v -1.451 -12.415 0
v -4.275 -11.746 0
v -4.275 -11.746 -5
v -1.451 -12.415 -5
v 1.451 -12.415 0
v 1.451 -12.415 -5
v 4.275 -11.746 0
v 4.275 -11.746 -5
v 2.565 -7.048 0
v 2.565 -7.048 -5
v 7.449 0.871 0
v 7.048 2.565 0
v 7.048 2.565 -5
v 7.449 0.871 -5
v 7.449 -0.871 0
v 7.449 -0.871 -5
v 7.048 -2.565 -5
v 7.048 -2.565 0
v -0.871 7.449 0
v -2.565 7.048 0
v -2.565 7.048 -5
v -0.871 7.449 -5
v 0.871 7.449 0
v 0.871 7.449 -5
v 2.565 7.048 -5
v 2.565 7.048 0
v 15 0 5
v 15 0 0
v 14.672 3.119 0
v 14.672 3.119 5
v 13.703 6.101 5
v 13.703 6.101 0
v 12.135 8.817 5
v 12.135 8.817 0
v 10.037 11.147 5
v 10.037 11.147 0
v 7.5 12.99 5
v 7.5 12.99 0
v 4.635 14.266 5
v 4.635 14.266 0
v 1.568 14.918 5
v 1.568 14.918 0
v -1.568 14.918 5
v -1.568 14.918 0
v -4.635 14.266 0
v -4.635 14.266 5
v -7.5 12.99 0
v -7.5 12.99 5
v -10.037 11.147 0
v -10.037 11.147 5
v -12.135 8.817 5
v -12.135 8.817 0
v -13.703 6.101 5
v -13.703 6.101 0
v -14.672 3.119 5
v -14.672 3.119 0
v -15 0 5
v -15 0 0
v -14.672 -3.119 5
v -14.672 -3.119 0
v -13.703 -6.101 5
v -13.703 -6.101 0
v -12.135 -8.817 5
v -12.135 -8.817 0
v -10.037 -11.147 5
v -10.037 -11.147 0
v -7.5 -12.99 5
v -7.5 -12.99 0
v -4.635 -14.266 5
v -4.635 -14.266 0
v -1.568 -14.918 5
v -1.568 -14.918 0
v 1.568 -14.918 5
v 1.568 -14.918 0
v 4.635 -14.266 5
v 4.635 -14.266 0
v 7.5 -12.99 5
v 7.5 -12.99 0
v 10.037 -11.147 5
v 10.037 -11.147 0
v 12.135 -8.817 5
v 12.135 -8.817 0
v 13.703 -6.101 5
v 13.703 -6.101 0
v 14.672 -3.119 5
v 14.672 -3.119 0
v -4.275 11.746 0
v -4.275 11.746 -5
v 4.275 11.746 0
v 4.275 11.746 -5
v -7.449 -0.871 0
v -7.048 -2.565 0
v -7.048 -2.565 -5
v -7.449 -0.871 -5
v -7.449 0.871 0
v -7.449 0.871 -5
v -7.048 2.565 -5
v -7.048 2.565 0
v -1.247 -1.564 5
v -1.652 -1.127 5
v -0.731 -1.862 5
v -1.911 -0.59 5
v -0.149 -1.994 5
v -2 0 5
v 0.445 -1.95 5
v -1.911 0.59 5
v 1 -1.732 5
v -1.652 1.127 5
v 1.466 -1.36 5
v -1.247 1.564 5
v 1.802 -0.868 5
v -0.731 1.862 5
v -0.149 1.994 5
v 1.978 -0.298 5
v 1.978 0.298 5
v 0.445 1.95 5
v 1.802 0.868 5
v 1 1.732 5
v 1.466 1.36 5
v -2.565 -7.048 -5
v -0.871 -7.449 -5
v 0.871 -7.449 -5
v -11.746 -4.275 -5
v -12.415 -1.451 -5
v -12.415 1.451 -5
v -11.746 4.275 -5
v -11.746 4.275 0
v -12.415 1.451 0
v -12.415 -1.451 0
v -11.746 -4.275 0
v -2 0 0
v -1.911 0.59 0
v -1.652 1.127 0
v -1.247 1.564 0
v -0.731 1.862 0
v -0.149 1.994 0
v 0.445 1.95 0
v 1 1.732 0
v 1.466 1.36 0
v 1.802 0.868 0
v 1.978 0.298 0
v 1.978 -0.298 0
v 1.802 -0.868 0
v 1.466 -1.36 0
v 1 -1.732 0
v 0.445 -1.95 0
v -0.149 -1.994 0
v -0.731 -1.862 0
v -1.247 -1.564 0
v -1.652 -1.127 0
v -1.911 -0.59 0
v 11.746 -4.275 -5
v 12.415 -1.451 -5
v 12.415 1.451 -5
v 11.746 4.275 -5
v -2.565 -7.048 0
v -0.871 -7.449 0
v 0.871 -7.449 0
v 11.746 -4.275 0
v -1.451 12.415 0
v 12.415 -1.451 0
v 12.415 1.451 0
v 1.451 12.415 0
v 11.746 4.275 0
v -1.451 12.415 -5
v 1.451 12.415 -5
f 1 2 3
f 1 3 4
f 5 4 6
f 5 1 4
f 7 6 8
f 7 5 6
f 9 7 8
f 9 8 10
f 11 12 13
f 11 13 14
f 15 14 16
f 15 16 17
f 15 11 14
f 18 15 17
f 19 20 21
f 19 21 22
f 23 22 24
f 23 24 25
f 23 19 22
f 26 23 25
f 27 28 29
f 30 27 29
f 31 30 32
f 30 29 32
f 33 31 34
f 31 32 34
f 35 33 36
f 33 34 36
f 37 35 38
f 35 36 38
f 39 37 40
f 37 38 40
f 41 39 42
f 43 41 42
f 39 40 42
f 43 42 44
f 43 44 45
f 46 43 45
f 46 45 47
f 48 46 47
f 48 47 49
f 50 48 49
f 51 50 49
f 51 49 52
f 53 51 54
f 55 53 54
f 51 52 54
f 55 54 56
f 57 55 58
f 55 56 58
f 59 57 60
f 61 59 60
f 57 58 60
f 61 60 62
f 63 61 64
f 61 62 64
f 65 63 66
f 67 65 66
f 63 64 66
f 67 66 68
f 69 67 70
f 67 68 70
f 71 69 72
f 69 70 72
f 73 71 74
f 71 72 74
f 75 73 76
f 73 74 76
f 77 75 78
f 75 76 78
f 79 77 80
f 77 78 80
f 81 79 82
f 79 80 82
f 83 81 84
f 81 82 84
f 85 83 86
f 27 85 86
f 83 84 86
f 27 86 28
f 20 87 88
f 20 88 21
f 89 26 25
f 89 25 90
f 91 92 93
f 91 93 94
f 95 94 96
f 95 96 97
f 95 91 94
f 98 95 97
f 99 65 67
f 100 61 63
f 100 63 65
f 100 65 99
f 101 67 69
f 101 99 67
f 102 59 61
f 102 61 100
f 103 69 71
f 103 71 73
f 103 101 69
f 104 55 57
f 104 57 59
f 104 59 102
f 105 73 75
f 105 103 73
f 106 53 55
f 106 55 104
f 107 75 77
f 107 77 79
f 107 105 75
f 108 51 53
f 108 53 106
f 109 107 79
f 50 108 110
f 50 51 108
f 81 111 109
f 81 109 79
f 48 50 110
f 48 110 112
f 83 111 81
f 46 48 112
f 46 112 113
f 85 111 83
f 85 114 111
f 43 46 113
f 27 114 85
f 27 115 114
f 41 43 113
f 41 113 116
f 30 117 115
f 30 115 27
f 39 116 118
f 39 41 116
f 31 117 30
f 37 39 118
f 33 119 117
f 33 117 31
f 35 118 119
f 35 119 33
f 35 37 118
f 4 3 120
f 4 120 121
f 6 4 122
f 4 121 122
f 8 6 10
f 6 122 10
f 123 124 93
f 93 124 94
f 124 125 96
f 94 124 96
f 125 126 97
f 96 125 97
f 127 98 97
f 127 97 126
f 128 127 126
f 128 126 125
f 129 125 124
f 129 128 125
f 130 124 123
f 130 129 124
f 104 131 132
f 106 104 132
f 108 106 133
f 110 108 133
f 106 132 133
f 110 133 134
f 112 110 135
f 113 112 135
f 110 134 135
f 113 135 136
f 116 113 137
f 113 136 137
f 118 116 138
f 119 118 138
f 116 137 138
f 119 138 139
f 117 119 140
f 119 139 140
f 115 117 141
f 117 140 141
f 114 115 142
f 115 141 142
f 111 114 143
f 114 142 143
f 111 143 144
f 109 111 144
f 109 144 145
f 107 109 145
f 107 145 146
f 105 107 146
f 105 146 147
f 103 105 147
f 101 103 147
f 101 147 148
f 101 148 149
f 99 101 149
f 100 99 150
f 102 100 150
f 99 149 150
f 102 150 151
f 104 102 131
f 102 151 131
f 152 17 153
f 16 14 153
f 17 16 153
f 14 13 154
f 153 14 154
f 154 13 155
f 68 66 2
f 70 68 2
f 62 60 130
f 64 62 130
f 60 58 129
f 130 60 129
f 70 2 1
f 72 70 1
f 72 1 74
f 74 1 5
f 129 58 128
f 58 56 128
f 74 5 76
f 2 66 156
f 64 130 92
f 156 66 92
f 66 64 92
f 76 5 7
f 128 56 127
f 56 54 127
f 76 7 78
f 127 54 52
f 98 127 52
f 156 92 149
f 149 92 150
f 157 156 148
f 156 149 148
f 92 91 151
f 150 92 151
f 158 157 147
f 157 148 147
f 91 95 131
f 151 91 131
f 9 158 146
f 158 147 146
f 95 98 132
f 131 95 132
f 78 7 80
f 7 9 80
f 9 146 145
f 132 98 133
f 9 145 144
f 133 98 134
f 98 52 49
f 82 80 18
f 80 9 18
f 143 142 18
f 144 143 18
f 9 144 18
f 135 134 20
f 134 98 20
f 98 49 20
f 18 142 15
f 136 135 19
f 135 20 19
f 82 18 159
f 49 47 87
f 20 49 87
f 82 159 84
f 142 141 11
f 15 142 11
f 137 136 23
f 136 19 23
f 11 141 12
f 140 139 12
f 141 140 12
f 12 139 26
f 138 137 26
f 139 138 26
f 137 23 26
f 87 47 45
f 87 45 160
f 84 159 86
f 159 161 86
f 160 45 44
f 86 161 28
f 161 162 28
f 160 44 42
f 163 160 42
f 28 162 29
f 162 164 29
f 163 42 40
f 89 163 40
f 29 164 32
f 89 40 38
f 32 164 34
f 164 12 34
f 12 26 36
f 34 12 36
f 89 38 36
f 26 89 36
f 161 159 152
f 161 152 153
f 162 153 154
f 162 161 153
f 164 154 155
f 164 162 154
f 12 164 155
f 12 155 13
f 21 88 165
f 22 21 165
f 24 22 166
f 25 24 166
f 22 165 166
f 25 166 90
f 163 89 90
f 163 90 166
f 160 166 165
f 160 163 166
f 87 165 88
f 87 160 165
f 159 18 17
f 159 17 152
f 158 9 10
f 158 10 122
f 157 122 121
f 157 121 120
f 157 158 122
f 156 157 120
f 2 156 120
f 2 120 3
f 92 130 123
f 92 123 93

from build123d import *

# Parameters (mm, degrees)
SKETCH_1_R          = 15
EXTRUDE_1_DEPTH     = 5
EXTRUDE_2_DEPTH     = 5
SKETCH_3_R          = 2
CUT_EXTRUDE_1_DEPTH = 5


with BuildPart() as part:
    # 草图1 → 凸台-拉伸1 (new body)
    with BuildSketch(Plane.XY):
        Circle(SKETCH_1_R)
    extrude(amount=EXTRUDE_1_DEPTH)

    # 草图2 → 凸台-拉伸2 (add)
    with BuildSketch(Plane(origin=(0, 0, 0), x_dir=(-1, 0, 0), z_dir=(0, 0, -1))):
        with BuildLine():
            Line((-2.565151075, 7.047694656), (-4.275251792, 11.74615776))
            ThreePointArc((-4.275251792, 11.74615776), (0, 12.5), (4.275251792, 11.74615776))
            Line((4.275251792, 11.74615776), (2.565151075, 7.047694656))
            ThreePointArc((2.565151075, 7.047694656), (0, 7.5), (-2.565151075, 7.047694656))
        make_face()
        with BuildLine():
            Line((7.047694656, 2.565151075), (11.74615776, 4.275251792))
            ThreePointArc((11.74615776, 4.275251792), (12.5, 0), (11.74615776, -4.275251792))
            Line((11.74615776, -4.275251792), (7.047694656, -2.565151075))
            ThreePointArc((7.047694656, -2.565151075), (7.5, 0), (7.047694656, 2.565151075))
        make_face()
        with BuildLine():
            Line((2.565151075, -7.047694656), (4.275251792, -11.74615776))
            ThreePointArc((4.275251792, -11.74615776), (0, -12.5), (-4.275251792, -11.74615776))
            Line((-4.275251792, -11.74615776), (-2.565151075, -7.047694656))
            ThreePointArc((-2.565151075, -7.047694656), (0, -7.5), (2.565151075, -7.047694656))
        make_face()
        with BuildLine():
            Line((-7.047694656, -2.565151075), (-11.74615776, -4.275251792))
            ThreePointArc((-11.74615776, -4.275251792), (-12.5, 0), (-11.74615776, 4.275251792))
            Line((-11.74615776, 4.275251792), (-7.047694656, 2.565151075))
            ThreePointArc((-7.047694656, 2.565151075), (-7.5, 0), (-7.047694656, -2.565151075))
        make_face()
    extrude(amount=EXTRUDE_2_DEPTH)

    # 草图3 → 切除-拉伸1 (cut)
    with BuildSketch(Plane(origin=(0, 0, 0), x_dir=(-1, 0, 0), z_dir=(0, 0, -1))):
        Circle(SKETCH_3_R)
    extrude(amount=-CUT_EXTRUDE_1_DEPTH, mode=Mode.SUBTRACT)


solid = part.part
